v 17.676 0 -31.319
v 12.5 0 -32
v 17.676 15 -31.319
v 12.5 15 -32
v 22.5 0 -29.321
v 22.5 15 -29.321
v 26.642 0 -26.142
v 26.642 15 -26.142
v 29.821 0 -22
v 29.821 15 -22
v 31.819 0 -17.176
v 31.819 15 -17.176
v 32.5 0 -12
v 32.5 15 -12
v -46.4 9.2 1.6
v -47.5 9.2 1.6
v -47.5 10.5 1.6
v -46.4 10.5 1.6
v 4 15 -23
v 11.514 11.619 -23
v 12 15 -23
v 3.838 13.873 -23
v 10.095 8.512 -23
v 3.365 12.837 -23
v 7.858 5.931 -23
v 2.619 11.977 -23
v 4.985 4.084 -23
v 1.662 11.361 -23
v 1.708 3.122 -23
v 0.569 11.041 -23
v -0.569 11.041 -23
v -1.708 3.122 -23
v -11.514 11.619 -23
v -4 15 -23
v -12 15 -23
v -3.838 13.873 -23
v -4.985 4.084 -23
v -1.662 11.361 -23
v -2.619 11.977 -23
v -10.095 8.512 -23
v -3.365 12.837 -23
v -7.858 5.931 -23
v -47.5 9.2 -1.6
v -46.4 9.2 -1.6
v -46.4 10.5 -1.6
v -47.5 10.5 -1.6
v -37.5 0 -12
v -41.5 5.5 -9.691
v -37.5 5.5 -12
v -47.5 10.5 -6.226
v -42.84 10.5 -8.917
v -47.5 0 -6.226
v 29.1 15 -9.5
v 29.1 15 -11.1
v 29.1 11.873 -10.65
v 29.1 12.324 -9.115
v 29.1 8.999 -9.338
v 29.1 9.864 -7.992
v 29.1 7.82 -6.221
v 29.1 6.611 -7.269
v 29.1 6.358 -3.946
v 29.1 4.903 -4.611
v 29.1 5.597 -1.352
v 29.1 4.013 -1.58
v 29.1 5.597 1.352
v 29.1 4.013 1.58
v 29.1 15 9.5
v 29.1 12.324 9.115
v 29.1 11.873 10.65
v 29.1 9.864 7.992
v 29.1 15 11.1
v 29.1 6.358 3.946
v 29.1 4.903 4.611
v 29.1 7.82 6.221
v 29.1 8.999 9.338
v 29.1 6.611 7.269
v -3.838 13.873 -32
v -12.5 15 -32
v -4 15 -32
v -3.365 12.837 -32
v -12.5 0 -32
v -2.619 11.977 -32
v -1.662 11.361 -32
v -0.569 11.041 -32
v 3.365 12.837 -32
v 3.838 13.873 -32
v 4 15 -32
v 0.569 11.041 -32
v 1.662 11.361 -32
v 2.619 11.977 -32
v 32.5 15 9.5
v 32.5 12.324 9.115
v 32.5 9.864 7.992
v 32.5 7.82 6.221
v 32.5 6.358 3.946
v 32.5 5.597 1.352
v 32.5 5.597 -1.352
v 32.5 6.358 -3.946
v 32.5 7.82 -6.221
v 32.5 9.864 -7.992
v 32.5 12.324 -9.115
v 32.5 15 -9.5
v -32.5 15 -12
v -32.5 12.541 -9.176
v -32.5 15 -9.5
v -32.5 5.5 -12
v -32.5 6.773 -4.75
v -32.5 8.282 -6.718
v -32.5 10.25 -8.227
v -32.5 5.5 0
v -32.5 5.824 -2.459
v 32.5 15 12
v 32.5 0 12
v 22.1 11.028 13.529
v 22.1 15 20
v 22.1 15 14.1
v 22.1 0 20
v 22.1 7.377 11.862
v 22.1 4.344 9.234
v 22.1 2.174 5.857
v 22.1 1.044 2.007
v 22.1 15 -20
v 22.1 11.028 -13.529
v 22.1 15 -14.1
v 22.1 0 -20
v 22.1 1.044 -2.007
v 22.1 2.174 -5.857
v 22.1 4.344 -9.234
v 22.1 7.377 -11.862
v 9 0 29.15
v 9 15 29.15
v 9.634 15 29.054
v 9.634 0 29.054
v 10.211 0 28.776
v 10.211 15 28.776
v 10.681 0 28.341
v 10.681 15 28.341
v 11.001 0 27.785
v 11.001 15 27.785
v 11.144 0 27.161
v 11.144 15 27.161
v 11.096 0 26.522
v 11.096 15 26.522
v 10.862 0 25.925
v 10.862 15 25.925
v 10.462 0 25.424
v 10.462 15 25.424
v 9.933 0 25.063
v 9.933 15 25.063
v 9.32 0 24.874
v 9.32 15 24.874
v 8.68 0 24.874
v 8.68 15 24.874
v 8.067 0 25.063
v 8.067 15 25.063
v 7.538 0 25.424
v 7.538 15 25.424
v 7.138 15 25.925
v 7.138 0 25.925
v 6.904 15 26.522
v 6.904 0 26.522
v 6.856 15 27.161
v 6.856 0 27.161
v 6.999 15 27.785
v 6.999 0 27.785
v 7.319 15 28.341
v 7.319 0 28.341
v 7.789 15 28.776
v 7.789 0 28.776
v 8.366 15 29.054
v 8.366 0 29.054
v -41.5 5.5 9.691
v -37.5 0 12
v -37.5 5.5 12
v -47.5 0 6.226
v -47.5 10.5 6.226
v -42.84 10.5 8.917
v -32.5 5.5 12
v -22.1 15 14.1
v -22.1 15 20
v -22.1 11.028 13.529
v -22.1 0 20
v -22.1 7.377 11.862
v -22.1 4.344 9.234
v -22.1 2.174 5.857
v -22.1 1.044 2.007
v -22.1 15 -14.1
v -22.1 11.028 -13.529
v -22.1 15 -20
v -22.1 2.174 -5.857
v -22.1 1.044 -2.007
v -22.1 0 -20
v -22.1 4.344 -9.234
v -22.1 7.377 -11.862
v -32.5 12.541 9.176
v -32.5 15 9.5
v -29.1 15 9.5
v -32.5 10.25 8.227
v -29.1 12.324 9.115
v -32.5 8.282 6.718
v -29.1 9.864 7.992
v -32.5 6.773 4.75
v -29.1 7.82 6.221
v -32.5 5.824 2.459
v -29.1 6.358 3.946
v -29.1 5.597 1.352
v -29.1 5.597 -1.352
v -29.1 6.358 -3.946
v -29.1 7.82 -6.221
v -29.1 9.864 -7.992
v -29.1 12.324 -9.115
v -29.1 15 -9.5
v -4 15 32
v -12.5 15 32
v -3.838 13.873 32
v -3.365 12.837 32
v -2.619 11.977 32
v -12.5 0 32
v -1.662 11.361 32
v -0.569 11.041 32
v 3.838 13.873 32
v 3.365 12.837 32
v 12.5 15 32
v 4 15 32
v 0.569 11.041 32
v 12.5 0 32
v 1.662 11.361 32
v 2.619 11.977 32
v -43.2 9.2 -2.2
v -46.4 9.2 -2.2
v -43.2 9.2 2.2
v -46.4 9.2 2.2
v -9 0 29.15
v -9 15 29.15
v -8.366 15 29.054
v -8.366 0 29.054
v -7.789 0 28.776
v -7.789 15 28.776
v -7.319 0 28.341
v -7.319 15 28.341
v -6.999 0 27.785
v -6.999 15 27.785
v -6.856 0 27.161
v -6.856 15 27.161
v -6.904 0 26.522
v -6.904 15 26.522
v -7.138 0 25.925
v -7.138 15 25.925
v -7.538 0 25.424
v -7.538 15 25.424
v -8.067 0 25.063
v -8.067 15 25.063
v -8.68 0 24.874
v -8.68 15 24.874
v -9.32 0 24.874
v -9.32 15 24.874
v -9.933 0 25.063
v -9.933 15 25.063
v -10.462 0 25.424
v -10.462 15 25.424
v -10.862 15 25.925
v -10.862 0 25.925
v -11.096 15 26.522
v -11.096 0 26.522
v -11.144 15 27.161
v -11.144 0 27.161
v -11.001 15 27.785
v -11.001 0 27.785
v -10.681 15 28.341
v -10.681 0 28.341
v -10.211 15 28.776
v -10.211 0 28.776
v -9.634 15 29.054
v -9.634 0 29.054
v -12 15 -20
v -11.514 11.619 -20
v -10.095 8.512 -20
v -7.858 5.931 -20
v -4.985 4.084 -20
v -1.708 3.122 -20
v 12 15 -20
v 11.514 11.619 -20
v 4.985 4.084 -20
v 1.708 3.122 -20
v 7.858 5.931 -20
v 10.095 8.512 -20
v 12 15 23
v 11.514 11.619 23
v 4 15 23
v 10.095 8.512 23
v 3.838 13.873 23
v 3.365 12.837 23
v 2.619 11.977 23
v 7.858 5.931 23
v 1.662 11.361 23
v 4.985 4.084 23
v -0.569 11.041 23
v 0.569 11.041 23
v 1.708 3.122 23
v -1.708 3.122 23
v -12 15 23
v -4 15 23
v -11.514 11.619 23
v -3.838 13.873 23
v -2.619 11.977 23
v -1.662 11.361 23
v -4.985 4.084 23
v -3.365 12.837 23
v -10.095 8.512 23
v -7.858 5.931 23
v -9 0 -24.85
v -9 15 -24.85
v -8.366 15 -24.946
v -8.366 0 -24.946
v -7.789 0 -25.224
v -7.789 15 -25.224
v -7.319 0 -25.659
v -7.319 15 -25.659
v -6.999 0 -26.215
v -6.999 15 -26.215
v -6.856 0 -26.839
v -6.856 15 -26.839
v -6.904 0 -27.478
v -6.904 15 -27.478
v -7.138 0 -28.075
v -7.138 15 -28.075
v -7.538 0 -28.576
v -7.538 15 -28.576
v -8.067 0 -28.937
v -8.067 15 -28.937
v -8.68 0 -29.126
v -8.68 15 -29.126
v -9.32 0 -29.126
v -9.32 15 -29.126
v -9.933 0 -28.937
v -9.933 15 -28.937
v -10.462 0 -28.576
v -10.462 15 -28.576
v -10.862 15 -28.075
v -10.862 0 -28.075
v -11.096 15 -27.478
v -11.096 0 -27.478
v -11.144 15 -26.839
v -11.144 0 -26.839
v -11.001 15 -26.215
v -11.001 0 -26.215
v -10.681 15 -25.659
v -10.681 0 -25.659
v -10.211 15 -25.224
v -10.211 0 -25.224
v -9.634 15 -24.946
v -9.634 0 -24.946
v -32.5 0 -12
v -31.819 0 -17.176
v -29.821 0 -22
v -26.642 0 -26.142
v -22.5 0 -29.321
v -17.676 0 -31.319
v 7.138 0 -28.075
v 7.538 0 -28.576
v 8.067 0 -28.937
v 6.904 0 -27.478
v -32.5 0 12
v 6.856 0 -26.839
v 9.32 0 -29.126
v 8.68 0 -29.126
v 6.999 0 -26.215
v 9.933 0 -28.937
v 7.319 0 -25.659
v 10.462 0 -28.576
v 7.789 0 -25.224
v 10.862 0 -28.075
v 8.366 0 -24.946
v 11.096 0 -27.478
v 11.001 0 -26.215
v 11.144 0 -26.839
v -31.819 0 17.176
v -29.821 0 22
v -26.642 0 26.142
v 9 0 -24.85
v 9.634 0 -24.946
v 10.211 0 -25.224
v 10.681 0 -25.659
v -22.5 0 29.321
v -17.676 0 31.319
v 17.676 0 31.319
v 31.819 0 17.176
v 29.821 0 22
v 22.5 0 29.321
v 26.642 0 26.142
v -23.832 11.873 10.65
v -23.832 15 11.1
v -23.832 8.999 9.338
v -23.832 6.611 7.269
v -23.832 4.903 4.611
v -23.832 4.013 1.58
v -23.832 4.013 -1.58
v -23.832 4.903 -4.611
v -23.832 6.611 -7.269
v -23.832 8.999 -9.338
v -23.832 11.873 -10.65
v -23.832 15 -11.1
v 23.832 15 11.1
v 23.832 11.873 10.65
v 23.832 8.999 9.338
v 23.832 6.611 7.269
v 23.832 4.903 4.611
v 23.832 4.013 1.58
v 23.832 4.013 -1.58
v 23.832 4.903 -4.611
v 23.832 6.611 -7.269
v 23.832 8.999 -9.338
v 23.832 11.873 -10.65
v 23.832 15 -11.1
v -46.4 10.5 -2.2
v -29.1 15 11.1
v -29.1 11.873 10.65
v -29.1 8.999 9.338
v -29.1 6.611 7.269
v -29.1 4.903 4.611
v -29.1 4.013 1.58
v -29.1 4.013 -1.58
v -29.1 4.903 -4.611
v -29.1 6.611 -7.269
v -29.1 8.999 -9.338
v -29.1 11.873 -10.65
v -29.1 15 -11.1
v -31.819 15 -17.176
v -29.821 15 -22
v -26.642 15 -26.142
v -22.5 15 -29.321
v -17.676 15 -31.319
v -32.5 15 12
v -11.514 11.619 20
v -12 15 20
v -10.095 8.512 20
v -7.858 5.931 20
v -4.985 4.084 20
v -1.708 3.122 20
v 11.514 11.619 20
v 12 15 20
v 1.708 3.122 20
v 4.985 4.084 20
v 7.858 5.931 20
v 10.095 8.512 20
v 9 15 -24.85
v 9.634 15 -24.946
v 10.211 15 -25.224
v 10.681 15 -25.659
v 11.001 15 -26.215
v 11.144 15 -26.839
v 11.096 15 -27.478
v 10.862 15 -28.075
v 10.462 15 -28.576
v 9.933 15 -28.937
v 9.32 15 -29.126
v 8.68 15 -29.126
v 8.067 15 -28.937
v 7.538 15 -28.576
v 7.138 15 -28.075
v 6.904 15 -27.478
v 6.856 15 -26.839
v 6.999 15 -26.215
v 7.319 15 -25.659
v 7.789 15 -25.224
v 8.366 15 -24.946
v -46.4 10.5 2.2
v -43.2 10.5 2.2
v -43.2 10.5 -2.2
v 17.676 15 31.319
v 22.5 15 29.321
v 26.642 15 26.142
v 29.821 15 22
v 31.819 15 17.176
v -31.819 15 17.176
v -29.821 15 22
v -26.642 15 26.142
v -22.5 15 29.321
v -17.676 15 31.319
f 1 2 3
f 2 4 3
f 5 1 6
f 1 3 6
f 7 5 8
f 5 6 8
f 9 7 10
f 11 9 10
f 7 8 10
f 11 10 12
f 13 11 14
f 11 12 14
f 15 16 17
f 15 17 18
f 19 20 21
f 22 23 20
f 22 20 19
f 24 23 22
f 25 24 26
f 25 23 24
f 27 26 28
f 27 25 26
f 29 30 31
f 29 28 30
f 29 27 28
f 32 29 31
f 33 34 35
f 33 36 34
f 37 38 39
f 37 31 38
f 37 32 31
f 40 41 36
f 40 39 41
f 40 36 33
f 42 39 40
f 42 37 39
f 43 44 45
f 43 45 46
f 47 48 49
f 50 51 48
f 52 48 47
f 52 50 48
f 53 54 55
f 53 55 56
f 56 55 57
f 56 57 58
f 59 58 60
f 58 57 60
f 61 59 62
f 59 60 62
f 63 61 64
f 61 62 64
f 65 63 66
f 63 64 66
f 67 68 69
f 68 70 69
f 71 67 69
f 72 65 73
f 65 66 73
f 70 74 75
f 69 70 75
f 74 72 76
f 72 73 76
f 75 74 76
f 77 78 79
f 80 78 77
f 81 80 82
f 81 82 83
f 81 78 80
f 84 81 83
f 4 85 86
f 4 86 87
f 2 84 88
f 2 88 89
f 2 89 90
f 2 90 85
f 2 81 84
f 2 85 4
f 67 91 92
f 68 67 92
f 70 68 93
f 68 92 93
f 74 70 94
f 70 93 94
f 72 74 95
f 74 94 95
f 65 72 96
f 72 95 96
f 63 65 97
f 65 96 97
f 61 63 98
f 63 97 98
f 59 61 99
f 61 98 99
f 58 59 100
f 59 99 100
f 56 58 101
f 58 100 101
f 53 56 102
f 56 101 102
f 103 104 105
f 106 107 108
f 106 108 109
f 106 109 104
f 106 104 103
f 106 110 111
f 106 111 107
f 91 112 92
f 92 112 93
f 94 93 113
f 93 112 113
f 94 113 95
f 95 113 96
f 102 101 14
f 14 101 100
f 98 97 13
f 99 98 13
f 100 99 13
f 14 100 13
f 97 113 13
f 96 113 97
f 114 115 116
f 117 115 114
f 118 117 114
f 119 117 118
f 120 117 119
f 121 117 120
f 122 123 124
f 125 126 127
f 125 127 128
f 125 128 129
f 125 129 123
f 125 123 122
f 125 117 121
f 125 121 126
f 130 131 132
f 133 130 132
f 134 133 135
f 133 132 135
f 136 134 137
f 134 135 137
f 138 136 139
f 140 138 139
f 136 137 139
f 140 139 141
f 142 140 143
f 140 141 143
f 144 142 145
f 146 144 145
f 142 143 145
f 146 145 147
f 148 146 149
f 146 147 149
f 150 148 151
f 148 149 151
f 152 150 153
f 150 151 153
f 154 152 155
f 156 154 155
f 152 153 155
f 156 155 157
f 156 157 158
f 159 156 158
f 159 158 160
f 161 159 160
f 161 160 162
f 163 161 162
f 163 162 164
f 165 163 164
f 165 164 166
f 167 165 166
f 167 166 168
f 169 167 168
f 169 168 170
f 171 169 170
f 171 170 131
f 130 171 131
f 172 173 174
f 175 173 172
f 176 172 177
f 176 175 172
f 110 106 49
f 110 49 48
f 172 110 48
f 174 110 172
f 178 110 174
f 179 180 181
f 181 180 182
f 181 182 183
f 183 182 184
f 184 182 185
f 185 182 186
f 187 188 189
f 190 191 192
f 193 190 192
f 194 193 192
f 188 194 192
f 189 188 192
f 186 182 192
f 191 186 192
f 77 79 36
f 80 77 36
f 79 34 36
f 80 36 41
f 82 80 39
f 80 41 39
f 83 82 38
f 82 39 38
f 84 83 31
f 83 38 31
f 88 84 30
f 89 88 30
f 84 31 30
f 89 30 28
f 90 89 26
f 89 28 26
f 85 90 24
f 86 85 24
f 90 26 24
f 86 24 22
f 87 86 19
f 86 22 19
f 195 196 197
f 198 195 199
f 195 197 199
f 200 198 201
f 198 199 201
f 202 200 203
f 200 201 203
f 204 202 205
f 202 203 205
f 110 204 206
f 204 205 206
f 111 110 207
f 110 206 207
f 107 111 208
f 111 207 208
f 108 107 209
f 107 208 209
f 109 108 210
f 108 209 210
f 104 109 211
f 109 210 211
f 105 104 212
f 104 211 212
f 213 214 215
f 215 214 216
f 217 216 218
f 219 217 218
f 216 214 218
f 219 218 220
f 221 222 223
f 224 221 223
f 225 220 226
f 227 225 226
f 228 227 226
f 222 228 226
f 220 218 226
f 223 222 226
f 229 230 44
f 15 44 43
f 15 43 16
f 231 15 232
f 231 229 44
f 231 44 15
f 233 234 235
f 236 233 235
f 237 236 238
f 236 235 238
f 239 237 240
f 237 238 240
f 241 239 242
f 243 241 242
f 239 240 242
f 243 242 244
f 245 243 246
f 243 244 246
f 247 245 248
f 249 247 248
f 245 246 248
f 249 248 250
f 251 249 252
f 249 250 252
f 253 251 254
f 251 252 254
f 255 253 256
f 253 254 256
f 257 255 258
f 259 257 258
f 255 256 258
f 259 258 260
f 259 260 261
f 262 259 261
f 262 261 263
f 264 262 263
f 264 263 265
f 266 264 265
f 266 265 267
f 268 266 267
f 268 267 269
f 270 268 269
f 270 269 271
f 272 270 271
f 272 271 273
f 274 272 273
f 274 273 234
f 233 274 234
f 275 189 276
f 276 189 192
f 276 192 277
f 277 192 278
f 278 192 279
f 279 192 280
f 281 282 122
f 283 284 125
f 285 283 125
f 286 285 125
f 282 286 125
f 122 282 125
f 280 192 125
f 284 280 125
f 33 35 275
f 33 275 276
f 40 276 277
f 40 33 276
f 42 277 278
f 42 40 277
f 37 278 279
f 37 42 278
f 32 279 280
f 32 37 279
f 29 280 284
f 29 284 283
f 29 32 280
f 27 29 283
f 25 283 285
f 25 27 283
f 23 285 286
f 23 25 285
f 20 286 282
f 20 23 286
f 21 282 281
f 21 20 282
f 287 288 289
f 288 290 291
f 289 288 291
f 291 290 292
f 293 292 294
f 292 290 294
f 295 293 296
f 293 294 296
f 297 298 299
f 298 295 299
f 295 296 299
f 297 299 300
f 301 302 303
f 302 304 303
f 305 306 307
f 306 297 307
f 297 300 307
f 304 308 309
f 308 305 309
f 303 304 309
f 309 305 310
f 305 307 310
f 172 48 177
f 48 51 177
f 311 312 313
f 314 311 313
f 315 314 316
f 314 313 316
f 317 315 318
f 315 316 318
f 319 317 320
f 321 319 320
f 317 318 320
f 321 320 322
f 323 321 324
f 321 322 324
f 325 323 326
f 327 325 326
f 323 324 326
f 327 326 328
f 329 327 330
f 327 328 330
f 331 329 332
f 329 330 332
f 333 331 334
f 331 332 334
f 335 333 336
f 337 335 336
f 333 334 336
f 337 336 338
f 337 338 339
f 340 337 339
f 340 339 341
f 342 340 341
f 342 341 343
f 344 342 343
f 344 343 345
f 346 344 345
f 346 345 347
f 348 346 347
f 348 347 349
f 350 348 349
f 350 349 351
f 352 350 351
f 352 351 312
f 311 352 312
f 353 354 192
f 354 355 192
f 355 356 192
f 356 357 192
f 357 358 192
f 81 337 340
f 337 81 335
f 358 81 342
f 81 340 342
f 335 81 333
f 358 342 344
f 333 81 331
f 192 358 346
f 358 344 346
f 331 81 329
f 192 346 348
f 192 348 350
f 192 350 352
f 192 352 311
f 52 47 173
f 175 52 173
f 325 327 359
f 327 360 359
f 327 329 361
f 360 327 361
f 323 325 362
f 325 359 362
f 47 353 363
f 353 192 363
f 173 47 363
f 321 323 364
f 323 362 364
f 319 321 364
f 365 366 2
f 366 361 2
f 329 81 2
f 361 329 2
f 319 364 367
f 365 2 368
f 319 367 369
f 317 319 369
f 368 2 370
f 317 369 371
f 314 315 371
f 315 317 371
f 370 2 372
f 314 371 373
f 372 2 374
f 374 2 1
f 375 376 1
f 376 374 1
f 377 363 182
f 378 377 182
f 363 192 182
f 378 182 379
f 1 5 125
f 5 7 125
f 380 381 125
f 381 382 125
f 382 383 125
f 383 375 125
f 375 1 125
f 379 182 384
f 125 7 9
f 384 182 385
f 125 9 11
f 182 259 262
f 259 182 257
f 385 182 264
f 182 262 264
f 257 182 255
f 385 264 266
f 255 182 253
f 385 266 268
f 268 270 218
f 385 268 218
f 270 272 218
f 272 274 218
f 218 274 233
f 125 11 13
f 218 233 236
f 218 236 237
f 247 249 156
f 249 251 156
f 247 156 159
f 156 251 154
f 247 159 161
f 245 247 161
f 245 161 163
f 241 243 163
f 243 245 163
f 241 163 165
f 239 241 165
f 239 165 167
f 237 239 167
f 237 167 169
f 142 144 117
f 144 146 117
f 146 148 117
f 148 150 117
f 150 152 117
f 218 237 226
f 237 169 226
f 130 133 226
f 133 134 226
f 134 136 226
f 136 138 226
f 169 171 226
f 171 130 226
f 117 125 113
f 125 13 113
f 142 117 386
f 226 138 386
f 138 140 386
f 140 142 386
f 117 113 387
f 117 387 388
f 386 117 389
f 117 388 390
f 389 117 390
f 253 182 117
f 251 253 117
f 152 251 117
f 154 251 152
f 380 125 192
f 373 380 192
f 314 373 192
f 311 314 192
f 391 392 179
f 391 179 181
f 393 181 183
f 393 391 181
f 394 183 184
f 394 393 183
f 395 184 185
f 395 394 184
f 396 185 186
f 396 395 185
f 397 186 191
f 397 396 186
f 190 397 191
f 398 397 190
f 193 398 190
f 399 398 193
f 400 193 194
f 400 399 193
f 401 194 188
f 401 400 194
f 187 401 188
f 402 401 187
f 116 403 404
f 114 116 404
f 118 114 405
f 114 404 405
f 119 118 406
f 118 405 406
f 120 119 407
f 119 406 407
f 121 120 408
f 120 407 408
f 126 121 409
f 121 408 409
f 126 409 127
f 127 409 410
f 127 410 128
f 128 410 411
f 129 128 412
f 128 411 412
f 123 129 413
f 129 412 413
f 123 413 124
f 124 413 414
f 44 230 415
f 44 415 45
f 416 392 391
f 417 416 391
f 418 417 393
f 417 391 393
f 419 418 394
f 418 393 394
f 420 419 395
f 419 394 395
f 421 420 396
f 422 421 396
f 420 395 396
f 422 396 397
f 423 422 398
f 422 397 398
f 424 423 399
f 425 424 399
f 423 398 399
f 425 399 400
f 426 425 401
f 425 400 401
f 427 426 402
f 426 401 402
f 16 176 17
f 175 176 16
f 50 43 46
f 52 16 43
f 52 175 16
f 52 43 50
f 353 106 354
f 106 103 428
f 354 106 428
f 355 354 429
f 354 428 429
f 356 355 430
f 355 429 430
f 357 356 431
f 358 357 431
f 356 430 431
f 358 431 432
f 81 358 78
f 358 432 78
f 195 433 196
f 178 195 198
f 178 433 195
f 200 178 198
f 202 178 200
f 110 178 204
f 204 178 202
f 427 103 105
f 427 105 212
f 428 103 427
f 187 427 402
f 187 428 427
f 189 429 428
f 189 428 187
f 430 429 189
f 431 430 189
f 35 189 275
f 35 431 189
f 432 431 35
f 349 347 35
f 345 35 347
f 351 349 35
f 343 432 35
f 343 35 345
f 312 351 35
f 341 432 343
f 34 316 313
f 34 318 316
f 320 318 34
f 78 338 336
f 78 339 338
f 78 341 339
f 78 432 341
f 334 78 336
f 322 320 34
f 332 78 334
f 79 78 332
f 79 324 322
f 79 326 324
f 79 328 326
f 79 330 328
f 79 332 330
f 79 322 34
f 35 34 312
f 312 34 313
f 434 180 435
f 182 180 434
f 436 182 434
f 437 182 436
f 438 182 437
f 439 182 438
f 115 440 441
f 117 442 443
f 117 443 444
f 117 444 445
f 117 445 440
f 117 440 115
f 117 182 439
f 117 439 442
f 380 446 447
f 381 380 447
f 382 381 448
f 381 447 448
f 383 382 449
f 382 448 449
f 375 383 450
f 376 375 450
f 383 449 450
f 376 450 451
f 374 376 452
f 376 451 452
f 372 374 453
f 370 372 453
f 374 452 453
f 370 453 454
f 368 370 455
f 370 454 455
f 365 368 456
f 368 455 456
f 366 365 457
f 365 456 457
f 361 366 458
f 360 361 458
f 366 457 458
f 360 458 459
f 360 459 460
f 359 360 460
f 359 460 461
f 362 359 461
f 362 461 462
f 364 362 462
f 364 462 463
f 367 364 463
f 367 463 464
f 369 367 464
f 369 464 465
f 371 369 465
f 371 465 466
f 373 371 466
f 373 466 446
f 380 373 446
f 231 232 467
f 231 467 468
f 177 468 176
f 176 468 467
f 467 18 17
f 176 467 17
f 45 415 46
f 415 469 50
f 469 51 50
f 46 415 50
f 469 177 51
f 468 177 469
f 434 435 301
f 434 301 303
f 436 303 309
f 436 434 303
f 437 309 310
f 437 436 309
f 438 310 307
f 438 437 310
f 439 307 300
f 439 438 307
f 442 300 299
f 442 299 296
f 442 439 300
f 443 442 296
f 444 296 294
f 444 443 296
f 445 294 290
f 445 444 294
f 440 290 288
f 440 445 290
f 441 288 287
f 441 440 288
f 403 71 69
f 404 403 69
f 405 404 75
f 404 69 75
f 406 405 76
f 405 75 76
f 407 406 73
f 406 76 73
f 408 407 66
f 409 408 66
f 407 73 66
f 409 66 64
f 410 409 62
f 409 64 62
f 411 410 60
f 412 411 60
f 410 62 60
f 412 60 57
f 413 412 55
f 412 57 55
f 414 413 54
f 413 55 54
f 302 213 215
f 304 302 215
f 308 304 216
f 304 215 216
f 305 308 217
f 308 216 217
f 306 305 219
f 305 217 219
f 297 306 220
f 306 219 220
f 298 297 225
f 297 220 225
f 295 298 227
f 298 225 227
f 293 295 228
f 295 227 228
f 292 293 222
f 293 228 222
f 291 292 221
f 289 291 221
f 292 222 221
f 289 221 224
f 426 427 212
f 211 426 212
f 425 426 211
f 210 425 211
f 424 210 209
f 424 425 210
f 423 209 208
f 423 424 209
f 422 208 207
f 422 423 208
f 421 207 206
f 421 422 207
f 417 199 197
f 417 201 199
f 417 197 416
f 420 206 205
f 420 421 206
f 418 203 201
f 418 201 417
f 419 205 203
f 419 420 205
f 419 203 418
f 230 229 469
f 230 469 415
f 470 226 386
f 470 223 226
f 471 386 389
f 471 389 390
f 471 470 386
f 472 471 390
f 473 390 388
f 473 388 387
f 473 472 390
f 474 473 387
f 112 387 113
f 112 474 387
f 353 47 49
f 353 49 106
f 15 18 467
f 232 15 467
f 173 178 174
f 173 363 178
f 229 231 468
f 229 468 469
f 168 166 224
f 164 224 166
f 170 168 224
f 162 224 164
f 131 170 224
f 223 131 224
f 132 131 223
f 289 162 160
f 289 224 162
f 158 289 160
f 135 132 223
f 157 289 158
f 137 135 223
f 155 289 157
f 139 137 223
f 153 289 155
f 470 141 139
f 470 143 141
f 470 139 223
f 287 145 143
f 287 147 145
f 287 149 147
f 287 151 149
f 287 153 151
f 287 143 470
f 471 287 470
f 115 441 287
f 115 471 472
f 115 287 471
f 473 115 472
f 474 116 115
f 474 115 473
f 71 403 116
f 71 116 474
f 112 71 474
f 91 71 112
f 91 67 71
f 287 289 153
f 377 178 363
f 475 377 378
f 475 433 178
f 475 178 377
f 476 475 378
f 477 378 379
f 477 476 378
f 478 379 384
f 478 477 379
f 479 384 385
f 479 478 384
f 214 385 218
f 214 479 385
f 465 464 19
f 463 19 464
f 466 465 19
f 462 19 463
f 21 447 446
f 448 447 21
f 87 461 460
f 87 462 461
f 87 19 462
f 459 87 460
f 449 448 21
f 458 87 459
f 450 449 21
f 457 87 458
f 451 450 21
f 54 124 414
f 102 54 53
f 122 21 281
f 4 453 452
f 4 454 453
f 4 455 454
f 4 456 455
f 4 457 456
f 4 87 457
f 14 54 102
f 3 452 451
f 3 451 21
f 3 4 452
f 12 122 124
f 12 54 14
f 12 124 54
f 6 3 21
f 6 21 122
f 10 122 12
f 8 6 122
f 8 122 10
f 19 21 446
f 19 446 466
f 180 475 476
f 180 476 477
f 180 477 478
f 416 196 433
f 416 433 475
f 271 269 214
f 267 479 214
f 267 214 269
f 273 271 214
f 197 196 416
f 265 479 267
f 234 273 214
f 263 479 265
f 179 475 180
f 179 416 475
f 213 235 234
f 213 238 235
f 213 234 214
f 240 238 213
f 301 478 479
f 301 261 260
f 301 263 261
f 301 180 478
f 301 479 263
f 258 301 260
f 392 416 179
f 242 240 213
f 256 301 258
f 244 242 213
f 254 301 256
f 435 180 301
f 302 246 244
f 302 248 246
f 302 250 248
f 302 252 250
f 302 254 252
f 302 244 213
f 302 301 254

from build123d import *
from OCP.BRepFilletAPI import BRepFilletAPI_MakeChamfer

# Parameters (mm, degrees)
SKETCH1_W           = 65
SKETCH1_H           = 64
SKETCH1_W_2         = 44.2
SKETCH1_H_2         = 40
BOSS_EXTRUDE1_DEPTH = 15
SKETCH3_W           = 7
SKETCH3_H           = 11.1
SKETCH4_R           = 9.5
CUT_EXTRUDE2_DEPTH  = 74.986485252
SKETCH5_R           = 4
CUT_EXTRUDE3_DEPTH  = 74.32973476
SKETCH8_R           = 2.15
CUT_EXTRUDE6_DEPTH  = 49.013019068
FILLET1_R           = 20
CHAMFER1_SIZE       = 3
CHAMFER1_SIZE2      = 1.732050808
SKETCH9_W           = 12
SKETCH9_H           = 3
SKETCH10_W          = 24
SKETCH10_H          = 5.5
BOSS_EXTRUDE2_DEPTH = 15
BOSS_EXTRUDE3_START = 9
SKETCH12_W          = 24
SKETCH12_H          = 3.7
BOSS_EXTRUDE3_DEPTH = 6
BOSS_EXTRUDE4_DEPTH = 1.3
CHAMFER2_SIZE2      = 1.339745962
CHAMFER2_SIZE       = 5
CHAMFER3_SIZE       = 10
CHAMFER3_SIZE2      = 5.773502692


with BuildPart() as part:
    # Sketch1 → Boss-Extrude1 (new body)
    with BuildSketch(Plane(origin=(0, 0, 0), x_dir=(1, 0, 0), z_dir=(0, 1, 0))):
        Rectangle(SKETCH1_W, SKETCH1_H)
        Rectangle(SKETCH1_W_2, SKETCH1_H_2, mode=Mode.SUBTRACT)
    extrude(amount=BOSS_EXTRUDE1_DEPTH)

    # Sketch3 → Cut-Revolve1 (revolve, cut)
    with BuildSketch(Plane(origin=(0, 15, 0), x_dir=(1, 0, 0), z_dir=(0, 1, 0))):
        with Locations((25.6, -5.55)):
            Rectangle(SKETCH3_W, SKETCH3_H)
        with Locations((-25.6, -5.55)):
            Rectangle(SKETCH3_W, SKETCH3_H)
    revolve(axis=Axis((22.1, 15, 0), (1, 0, 0)), mode=Mode.SUBTRACT)

    # Sketch4 → Cut-Extrude2 (cut, through all)
    with BuildSketch(Plane(origin=(32.5, 0, 0), x_dir=(0, 0, -1), z_dir=(1, 0, 0))):
        with Locations((0, 15)):
            Circle(SKETCH4_R)
    extrude(amount=-CUT_EXTRUDE2_DEPTH, mode=Mode.SUBTRACT)

    # Sketch5 → Cut-Extrude3 (cut, through all)
    with BuildSketch(Plane.XY.offset(32)):
        with Locations((0, 15)):
            Circle(SKETCH5_R)
    extrude(amount=-CUT_EXTRUDE3_DEPTH, mode=Mode.SUBTRACT)

    # Sketch8 → Cut-Extrude6 (cut, through all)
    with BuildSketch(Plane(origin=(0, 15, 0), x_dir=(1, 0, 0), z_dir=(0, 1, 0))):
        with Locations((18, 16.5)):
            Circle(SKETCH8_R)
        with Locations((18, -16.5)):
            Circle(SKETCH8_R)
        with Locations((-18, -16.5)):
            Circle(SKETCH8_R)
        with Locations((-18, 16.5)):
            Circle(SKETCH8_R)
        with Locations(Location((9, -27, 0), (0, 0, 270))):
            Circle(SKETCH8_R)
        with Locations(Location((-9, -27, 0), (0, 0, 270))):
            Circle(SKETCH8_R)
        with Locations(Location((-9, 27, 0), (0, 0, 270))):
            Circle(SKETCH8_R)
        with Locations(Location((9, 27, 0), (0, 0, 270))):
            Circle(SKETCH8_R)
    extrude(amount=-CUT_EXTRUDE6_DEPTH, mode=Mode.SUBTRACT)

    # Fillet1
    fillet1_edges = [part.edges().sort_by_distance(p)[0] for p in [
        (-32.5, 7.5, -32),
        (32.5, 7.5, -32),
        (32.5, 7.5, 32),
        (-32.5, 7.5, 32),
    ]]
    fillet(fillet1_edges, radius=FILLET1_R)

    # Chamfer1: one chamfer whose edges measure the first distance from different faces: ONE call of the kernel's chamfer builder (chamfer() names one face for all edges)
    chamfer1_edges_1 = [part.edges().sort_by_distance(p)[0] for p in [
        (22.1, 3.9, 0),
    ]]
    chamfer1_side_1 = [part.faces().sort_by_distance(p)[0] for p in [
        (22.1, 0.427200187, 0),
    ]]
    chamfer1_edges_2 = [part.edges().sort_by_distance(p)[0] for p in [
        (-22.1, 3.9, 0),
    ]]
    chamfer1_side_2 = [part.faces().sort_by_distance(p)[0] for p in [
        (-22.1, 0.427200187, 0),
    ]]
    chamfer1 = BRepFilletAPI_MakeChamfer(part.part.solid().wrapped)
    for e in chamfer1_edges_1:
        chamfer1.Add(CHAMFER1_SIZE, CHAMFER1_SIZE2, e.wrapped, chamfer1_side_1[0].wrapped)  # the first distance lies on this face
    for e in chamfer1_edges_2:
        chamfer1.Add(CHAMFER1_SIZE, CHAMFER1_SIZE2, e.wrapped, chamfer1_side_2[0].wrapped)  # the first distance lies on this face
    add(Compound.cast(chamfer1.Shape()), mode=Mode.REPLACE)

    # Sketch9 → Cut-Revolve2 (revolve, cut)
    with BuildSketch(Plane(origin=(0, 15, 0), x_dir=(1, 0, 0), z_dir=(0, 1, 0))):
        with Locations((-6, -21.5)):
            Rectangle(SKETCH9_W, SKETCH9_H)
        with Locations((-6, 21.5)):
            Rectangle(SKETCH9_W, SKETCH9_H)
    revolve(axis=Axis((0, 15, -29.871415895), (0, 0, 1)), mode=Mode.SUBTRACT)

    # Sketch10 → Boss-Extrude2 (add)
    with BuildSketch(Plane.ZY.offset(32.5)):
        with Locations((0, 2.75)):
            Rectangle(SKETCH10_W, SKETCH10_H)
    extrude(amount=BOSS_EXTRUDE2_DEPTH)

    # Sketch12 → Boss-Extrude3 (add)
    with BuildSketch(Plane.ZY.offset(32.5).offset(BOSS_EXTRUDE3_START)):
        with Locations((0, 7.35)):
            Rectangle(SKETCH12_W, SKETCH12_H)
    extrude(amount=BOSS_EXTRUDE3_DEPTH)

    # Sketch13 → Boss-Extrude4 (add)
    with BuildSketch(Plane(origin=(0, 9.2, 0), x_dir=(1, 0, 0), z_dir=(0, 1, 0))):
        Polygon((-46.4, 2.2), (-46.4, 1.6), (-47.5, 1.6), (-47.5, 12), (-41.5, 12), (-41.5, -12), (-47.5, -12), (-47.5, -1.6), (-46.4, -1.6), (-46.4, -2.2), (-43.2, -2.2), (-43.2, 2.2), align=None)
    extrude(amount=BOSS_EXTRUDE4_DEPTH)

    # Chamfer2
    chamfer2_edges = [part.edges().sort_by_distance(p)[0] for p in [
        (-41.5, 10.5, 0),
    ]]
    chamfer2_side = [part.faces().sort_by_distance(p)[0] for p in [
        (-41.5, 10.473205081, 0),
    ]]
    chamfer(chamfer2_edges, length=CHAMFER2_SIZE - 0.0001, length2=CHAMFER2_SIZE2 - 0.0001, reference=chamfer2_side[0])  # a hair under: the kernel refuses the full size

    # Chamfer3: one chamfer whose edges measure the first distance from different faces: ONE call of the kernel's chamfer builder (chamfer() names one face for all edges)
    chamfer3_edges_1 = [part.edges().sort_by_distance(p)[0] for p in [
        (-47.5, 5.25, 12),
    ]]
    chamfer3_side_1 = [part.faces().sort_by_distance(p)[0] for p in [
        (-41.177093858, 4.00630158, 12),
    ]]
    chamfer3_edges_2 = [part.edges().sort_by_distance(p)[0] for p in [
        (-47.5, 5.25, -12),
    ]]
    chamfer3_side_2 = [part.faces().sort_by_distance(p)[0] for p in [
        (-41.177093858, 4.00630158, -12),
    ]]
    chamfer3 = BRepFilletAPI_MakeChamfer(part.part.solid().wrapped)
    for e in chamfer3_edges_1:
        chamfer3.Add(CHAMFER3_SIZE, CHAMFER3_SIZE2, e.wrapped, chamfer3_side_1[0].wrapped)  # the first distance lies on this face
    for e in chamfer3_edges_2:
        chamfer3.Add(CHAMFER3_SIZE, CHAMFER3_SIZE2, e.wrapped, chamfer3_side_2[0].wrapped)  # the first distance lies on this face
    add(Compound.cast(chamfer3.Shape()), mode=Mode.REPLACE)


solid = part.part
